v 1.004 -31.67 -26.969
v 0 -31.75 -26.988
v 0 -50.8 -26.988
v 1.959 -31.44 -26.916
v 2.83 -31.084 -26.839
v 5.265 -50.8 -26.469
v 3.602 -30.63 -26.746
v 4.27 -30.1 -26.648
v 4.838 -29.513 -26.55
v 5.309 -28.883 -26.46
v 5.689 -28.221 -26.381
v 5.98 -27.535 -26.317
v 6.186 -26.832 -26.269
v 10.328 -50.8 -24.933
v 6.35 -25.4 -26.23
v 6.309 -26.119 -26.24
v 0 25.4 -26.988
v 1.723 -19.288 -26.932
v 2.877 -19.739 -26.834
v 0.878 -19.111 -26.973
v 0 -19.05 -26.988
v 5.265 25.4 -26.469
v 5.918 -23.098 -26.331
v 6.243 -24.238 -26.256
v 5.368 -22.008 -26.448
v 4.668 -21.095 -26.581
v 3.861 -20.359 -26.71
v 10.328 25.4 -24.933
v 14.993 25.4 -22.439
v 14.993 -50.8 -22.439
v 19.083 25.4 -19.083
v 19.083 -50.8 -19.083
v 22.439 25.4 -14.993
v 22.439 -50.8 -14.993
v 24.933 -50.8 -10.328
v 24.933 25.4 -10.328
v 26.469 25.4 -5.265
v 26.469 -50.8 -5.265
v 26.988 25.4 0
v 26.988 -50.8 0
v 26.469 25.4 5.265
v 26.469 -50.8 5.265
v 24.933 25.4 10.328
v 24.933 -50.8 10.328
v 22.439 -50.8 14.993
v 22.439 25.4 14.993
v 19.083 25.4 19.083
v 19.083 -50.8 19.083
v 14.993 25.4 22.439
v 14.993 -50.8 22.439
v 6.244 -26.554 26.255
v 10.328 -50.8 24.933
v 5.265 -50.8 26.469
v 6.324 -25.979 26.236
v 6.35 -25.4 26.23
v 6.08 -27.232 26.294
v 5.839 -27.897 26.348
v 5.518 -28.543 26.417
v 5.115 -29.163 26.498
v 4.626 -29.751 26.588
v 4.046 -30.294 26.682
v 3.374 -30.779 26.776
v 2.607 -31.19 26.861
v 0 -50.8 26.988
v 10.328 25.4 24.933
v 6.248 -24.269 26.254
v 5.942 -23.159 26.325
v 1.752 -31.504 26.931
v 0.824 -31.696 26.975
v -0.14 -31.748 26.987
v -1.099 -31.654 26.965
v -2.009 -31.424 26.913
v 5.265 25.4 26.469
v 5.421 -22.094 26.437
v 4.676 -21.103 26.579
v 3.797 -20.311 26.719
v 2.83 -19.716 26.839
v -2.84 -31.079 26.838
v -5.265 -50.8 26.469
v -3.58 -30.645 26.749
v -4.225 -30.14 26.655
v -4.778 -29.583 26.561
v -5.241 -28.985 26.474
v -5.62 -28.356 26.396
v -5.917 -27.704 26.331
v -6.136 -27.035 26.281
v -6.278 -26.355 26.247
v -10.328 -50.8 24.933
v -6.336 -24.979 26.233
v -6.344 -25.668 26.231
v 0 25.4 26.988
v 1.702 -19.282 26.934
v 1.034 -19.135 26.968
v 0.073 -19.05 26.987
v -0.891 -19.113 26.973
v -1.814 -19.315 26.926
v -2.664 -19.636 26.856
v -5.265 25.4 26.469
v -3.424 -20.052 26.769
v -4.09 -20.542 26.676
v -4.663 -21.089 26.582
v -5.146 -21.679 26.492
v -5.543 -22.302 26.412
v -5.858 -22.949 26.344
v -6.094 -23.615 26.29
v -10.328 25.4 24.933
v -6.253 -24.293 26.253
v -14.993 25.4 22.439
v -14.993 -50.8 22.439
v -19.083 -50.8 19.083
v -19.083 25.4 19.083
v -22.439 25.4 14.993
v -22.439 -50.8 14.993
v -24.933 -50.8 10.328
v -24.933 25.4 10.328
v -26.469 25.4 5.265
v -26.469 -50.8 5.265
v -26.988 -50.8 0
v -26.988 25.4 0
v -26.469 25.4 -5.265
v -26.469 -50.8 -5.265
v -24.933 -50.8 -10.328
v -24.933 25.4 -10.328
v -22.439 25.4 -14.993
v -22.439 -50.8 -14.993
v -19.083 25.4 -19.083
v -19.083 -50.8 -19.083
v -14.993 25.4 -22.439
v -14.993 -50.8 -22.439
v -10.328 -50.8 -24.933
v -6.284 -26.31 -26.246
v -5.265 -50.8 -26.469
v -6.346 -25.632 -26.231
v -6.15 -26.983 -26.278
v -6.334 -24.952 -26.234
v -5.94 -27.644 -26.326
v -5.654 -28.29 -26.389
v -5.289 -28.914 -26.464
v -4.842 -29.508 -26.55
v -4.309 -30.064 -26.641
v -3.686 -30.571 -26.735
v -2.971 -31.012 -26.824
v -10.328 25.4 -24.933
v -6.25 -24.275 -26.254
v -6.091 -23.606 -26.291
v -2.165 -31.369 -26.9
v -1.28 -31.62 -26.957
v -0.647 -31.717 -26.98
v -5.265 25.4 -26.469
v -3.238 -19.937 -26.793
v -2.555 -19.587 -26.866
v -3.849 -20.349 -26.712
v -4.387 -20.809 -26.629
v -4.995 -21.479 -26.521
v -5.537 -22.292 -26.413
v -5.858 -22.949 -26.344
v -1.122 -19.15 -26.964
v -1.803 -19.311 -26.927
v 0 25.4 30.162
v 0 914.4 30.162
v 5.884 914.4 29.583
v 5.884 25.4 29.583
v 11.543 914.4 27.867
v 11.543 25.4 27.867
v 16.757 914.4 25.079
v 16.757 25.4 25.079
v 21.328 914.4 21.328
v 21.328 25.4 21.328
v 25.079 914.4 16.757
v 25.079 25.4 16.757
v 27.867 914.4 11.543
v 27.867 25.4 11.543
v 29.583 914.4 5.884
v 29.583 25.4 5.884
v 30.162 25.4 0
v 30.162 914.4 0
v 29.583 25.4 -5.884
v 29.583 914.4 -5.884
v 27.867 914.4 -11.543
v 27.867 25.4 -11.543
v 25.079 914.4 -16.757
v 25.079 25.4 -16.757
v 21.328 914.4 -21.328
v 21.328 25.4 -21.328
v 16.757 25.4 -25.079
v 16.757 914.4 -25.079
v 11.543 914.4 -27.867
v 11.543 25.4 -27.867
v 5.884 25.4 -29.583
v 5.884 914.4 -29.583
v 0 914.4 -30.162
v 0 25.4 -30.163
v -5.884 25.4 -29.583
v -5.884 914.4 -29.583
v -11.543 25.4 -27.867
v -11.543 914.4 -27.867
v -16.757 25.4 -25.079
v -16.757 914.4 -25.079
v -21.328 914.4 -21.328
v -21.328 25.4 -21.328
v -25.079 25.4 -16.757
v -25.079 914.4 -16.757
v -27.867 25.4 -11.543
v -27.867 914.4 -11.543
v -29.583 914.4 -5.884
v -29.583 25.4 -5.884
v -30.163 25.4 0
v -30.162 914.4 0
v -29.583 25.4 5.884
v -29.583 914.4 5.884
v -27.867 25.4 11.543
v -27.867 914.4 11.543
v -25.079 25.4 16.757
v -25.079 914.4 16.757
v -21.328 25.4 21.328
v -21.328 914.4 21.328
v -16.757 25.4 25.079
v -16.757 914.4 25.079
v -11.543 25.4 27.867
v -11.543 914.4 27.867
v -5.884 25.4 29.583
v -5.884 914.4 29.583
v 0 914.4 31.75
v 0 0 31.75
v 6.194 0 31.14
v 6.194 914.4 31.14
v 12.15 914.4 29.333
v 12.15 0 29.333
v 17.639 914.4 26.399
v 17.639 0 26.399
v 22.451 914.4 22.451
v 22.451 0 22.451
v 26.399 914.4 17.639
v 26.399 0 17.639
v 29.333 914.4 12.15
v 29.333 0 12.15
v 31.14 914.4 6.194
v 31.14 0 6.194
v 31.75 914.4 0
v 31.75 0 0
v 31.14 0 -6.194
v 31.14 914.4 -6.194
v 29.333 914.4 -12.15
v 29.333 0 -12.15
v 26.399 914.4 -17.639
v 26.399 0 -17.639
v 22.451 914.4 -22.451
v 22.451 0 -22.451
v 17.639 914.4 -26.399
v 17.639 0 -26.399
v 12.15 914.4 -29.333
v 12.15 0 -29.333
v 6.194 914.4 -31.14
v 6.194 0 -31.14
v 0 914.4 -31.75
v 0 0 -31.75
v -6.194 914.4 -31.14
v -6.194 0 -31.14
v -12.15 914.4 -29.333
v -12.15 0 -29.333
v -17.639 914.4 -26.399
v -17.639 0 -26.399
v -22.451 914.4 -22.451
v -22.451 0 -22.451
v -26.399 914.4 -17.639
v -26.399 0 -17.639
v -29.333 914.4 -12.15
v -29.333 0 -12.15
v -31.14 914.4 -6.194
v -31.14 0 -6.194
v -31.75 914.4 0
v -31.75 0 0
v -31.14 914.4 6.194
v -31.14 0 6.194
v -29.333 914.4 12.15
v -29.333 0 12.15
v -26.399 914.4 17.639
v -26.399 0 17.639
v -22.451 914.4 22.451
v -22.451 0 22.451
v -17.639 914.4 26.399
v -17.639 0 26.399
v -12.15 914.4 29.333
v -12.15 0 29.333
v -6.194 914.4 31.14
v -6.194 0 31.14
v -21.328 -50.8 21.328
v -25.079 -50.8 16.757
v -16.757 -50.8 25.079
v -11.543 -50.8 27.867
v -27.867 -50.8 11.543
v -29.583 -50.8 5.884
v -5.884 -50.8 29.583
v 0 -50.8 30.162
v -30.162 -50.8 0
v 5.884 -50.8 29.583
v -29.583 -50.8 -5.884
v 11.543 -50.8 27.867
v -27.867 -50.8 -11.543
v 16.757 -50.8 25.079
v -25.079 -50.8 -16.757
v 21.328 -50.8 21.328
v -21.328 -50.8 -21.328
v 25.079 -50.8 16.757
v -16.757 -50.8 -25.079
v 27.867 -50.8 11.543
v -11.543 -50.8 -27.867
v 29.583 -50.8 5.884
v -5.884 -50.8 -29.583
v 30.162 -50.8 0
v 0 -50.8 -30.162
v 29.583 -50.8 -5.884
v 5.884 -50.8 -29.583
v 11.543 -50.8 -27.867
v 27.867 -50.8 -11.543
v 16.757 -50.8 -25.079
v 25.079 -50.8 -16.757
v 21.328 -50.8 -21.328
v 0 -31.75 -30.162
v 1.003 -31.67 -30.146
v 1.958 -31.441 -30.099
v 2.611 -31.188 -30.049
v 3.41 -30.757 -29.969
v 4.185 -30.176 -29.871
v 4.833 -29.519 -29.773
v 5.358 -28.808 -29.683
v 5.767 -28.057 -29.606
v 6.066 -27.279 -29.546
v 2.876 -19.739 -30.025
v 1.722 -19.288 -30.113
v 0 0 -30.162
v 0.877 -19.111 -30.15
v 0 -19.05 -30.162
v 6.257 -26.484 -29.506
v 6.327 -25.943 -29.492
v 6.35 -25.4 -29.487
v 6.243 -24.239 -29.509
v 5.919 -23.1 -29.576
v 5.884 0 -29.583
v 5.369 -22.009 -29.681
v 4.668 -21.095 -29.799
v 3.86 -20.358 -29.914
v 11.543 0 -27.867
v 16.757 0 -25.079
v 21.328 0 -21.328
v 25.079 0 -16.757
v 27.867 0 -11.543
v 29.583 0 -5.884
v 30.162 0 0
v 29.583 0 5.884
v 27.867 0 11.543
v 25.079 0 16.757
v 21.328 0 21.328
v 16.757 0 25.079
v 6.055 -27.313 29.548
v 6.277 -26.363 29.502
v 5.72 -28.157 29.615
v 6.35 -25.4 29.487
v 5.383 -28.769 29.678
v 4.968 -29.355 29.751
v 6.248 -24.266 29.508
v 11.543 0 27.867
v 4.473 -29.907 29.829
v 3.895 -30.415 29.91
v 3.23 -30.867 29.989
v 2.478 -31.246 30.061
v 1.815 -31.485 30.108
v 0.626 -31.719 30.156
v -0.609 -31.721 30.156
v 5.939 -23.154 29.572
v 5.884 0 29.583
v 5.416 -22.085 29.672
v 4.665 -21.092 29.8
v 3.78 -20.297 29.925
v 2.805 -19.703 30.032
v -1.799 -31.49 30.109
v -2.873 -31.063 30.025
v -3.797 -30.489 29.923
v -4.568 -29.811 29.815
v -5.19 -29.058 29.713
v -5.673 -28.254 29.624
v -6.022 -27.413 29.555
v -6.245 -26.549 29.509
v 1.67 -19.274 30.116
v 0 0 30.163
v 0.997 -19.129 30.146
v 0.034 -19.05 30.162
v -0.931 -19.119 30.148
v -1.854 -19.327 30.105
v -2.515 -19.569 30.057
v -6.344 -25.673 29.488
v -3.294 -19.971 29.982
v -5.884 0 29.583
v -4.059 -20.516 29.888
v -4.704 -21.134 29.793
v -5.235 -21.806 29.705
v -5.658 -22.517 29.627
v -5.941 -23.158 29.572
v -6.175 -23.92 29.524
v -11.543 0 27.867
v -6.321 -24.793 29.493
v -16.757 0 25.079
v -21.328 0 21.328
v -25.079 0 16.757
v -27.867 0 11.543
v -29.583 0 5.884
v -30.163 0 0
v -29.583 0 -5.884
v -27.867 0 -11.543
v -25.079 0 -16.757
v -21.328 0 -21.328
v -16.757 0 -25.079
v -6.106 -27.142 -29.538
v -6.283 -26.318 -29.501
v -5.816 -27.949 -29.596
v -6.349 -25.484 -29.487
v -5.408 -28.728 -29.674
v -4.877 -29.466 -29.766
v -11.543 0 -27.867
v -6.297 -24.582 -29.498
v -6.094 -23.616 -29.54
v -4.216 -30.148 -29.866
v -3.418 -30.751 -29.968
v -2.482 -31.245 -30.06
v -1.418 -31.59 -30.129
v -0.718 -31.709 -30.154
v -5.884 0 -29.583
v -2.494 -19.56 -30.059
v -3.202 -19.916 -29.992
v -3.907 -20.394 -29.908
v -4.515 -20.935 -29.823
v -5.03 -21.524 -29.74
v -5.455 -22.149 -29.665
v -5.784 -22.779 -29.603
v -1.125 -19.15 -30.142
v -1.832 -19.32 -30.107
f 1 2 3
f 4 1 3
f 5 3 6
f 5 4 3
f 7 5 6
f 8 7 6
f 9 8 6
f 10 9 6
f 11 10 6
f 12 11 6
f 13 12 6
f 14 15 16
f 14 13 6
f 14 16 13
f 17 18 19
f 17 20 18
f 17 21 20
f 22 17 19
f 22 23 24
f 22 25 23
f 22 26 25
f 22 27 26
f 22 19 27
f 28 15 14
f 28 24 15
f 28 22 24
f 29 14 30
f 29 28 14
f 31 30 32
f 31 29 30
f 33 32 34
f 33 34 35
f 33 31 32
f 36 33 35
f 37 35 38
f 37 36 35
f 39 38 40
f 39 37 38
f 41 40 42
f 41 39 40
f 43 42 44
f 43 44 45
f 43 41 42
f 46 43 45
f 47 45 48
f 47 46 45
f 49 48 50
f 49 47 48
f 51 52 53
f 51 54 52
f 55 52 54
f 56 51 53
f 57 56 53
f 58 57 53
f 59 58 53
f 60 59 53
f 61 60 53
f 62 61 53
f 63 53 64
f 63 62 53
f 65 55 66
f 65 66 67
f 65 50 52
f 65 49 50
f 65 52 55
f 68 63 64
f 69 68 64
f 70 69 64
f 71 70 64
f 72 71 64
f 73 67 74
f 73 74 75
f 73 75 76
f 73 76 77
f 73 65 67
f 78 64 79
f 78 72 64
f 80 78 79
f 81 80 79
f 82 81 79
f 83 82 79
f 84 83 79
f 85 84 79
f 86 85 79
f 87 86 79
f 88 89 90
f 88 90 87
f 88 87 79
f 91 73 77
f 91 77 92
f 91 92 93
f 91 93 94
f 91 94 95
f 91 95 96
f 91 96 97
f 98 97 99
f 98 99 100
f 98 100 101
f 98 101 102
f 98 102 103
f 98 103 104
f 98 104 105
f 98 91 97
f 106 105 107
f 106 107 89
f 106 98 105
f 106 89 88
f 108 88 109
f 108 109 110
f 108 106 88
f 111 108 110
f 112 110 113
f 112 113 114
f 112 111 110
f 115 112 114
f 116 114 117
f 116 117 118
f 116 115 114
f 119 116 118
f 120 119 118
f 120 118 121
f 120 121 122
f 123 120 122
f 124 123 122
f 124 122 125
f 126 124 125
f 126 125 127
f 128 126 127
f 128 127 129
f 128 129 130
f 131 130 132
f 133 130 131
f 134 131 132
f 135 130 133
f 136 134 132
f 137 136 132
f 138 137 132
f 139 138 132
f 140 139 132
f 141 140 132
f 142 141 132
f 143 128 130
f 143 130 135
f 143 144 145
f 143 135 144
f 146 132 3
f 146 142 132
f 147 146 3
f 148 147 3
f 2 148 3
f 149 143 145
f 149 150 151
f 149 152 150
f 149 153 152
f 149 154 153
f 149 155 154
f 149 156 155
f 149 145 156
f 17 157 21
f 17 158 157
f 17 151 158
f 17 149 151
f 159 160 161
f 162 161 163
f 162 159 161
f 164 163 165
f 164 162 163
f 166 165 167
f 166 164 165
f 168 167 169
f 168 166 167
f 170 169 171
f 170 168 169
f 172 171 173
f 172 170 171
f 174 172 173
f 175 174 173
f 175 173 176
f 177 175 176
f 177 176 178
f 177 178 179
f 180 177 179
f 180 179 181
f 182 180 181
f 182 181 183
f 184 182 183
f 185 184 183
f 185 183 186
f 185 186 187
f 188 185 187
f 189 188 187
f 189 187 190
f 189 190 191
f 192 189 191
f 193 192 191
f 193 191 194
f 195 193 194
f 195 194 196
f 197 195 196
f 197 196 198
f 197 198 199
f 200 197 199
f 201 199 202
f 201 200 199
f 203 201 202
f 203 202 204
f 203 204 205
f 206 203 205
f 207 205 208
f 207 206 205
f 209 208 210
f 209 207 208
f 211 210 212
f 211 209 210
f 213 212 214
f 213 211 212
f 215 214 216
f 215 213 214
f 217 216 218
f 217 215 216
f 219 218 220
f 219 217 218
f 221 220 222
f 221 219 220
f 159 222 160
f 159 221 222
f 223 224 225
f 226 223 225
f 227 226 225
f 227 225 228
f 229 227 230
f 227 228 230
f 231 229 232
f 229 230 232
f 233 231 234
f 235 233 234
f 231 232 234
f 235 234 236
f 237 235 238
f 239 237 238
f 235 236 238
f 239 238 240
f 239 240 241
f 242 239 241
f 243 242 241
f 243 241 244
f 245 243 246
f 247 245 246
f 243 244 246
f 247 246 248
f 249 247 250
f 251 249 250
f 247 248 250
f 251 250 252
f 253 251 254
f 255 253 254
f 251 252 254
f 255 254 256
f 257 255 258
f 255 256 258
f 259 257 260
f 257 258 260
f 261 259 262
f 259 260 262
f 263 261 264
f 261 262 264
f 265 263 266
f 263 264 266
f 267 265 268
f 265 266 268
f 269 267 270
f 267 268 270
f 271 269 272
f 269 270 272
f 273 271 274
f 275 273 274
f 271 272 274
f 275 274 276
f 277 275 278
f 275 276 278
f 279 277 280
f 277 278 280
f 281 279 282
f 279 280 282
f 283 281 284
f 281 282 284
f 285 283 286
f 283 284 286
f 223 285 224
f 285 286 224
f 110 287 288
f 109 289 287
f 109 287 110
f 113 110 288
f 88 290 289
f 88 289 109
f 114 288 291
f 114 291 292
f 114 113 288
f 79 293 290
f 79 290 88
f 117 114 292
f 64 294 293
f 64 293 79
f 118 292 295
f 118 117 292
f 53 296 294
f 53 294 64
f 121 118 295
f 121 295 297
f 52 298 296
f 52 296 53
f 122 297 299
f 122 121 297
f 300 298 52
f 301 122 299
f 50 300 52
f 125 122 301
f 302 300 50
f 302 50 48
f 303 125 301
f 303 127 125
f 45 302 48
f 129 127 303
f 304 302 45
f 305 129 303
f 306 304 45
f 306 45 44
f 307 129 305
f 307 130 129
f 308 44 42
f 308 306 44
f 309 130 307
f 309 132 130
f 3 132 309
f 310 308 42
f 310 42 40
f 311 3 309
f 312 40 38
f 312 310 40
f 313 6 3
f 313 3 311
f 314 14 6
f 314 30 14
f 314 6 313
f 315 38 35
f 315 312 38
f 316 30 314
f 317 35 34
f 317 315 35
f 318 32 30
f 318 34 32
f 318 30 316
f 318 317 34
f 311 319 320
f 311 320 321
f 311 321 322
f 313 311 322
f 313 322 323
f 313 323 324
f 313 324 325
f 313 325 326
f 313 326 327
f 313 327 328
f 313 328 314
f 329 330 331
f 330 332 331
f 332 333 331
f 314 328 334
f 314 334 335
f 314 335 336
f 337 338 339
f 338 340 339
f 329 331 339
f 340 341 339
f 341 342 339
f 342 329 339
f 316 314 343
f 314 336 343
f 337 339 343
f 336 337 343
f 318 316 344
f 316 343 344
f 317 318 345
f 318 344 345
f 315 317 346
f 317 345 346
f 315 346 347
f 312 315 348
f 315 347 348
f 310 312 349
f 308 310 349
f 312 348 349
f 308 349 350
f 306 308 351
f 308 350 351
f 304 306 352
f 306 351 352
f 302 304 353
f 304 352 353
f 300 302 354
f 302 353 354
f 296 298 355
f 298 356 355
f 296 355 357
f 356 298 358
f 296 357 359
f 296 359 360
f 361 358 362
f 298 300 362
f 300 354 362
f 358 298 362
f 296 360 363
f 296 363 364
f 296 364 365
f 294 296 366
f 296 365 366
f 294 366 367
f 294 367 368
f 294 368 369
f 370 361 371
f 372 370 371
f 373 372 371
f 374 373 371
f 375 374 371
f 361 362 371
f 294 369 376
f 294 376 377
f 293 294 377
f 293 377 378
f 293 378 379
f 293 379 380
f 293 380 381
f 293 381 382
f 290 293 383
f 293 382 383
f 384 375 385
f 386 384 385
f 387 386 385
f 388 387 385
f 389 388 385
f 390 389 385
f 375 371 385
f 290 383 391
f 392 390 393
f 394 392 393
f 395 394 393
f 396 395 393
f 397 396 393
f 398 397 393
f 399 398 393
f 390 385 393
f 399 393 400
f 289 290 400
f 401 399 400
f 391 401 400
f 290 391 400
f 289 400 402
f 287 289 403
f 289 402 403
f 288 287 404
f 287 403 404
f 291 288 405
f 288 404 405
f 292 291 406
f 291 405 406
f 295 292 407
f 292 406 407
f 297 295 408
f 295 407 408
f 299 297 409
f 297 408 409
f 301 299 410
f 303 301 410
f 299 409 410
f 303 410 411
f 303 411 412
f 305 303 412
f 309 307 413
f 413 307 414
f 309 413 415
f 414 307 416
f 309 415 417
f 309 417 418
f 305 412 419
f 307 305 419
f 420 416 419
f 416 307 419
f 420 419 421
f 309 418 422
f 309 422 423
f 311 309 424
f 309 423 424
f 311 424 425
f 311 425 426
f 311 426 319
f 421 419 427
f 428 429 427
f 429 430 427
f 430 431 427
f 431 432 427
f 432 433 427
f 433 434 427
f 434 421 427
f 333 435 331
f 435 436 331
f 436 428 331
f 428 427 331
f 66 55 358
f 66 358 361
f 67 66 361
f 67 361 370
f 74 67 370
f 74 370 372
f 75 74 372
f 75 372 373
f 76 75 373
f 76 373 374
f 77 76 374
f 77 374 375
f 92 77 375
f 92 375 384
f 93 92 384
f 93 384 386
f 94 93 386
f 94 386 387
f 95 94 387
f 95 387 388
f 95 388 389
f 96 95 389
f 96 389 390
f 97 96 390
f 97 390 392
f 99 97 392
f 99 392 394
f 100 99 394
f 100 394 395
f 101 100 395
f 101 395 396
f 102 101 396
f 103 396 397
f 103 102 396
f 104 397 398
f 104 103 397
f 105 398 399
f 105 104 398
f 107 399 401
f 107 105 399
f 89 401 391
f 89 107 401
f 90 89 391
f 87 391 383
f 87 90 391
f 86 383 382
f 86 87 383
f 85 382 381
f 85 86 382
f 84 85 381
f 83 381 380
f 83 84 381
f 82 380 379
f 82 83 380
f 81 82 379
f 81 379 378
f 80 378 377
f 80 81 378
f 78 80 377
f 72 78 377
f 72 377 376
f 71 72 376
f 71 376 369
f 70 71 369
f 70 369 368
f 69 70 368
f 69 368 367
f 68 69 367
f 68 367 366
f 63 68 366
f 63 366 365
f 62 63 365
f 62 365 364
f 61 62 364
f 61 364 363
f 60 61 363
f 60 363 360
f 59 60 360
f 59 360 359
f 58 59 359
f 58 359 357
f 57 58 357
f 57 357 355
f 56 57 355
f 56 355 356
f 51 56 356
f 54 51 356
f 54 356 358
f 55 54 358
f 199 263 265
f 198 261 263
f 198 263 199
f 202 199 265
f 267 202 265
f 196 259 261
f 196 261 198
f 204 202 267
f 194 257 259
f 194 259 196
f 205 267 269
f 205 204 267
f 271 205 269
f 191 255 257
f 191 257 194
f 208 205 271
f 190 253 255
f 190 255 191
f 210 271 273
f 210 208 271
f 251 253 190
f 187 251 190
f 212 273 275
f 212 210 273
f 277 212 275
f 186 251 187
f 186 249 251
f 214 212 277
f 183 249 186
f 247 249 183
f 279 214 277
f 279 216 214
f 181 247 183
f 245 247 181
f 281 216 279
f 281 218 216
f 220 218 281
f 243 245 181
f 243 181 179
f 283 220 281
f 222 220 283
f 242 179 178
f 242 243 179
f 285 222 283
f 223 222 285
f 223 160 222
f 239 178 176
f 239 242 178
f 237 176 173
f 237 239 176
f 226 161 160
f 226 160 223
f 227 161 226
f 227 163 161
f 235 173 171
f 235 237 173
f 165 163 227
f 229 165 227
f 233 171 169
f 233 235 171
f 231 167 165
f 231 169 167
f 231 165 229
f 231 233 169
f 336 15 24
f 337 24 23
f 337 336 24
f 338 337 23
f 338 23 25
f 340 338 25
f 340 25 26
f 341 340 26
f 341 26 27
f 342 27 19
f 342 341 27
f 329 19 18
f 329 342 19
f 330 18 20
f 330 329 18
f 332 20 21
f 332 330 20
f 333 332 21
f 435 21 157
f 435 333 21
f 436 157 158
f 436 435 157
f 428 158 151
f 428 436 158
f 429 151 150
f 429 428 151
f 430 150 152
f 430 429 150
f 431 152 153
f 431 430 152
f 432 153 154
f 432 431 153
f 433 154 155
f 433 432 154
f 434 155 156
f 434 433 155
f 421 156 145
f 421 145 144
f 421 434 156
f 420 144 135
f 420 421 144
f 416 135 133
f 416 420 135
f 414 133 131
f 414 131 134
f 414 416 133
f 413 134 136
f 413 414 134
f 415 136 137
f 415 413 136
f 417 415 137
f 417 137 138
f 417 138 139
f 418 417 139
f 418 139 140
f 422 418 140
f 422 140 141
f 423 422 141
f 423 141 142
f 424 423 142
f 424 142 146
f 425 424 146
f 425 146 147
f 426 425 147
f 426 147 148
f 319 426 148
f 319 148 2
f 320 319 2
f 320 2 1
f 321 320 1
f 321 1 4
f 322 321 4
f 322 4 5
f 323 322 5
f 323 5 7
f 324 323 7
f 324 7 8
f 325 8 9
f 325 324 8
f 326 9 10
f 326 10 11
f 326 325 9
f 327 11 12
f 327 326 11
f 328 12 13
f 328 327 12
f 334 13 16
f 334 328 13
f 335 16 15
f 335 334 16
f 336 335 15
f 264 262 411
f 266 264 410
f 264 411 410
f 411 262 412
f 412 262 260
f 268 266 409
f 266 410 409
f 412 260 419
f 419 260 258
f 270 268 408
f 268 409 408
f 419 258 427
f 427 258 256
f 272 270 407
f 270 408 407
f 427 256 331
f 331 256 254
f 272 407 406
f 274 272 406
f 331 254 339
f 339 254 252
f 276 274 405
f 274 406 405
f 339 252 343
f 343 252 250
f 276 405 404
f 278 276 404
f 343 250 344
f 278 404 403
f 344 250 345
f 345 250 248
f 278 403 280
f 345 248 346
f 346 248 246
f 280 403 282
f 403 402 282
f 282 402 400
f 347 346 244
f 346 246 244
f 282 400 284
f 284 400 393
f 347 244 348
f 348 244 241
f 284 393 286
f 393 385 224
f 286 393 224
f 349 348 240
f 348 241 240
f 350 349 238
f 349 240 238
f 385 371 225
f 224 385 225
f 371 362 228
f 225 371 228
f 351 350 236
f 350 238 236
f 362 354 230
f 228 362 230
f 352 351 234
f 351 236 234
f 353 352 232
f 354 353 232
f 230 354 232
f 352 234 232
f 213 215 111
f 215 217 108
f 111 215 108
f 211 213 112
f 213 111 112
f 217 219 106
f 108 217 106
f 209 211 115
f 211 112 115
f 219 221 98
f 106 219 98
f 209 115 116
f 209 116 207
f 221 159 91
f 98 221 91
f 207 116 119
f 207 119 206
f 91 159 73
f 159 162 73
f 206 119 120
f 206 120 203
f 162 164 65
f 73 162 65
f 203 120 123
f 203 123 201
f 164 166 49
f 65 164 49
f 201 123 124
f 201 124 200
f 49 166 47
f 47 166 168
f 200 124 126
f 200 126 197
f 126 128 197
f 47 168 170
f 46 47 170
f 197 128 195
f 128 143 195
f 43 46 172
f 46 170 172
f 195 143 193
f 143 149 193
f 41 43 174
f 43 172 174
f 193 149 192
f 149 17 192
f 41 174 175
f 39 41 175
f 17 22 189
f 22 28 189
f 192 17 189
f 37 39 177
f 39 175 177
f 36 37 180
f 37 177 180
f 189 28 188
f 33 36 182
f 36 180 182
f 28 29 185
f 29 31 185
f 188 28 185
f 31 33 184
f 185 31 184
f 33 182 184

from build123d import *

# Parameters (mm, degrees)
SKETCH1_R                = 31.75
SKETCH1_R_2              = 30.1625
BOSS_EXTRUDE1_DEPTH      = 914.4
BOSS_EXTRUDE2_DEPTH      = 50.8
BOSS_EXTRUDE2_DEPTH_BACK = 25.4
SKETCH3_R                = 30.1625
SKETCH3_R_2              = 26.9875
CUT_EXTRUDE2_DEPTH       = 916.501766792
CUT_EXTRUDE2_DEPTH_BACK  = 916.501766792
SKETCH7_R                = 6.35


with BuildPart() as part:
    # Sketch1 → Boss-Extrude1 (new body)
    with BuildSketch(Plane(origin=(0, 0, 0), x_dir=(1, 0, 0), z_dir=(0, 1, 0))):
        with Locations(Location((0, 0, 0), (0, 0, 270))):
            Circle(SKETCH1_R)
        with Locations(Location((0, 0, 0), (0, 0, 270))):
            Circle(SKETCH1_R_2, mode=Mode.SUBTRACT)
    extrude(amount=BOSS_EXTRUDE1_DEPTH)

    # Sketch3 → Boss-Extrude2 (add, two sides: drawn at the far end of the back side and taken through both)
    with BuildSketch(Plane.XZ.offset(-BOSS_EXTRUDE2_DEPTH_BACK)):
        with Locations(Location((0, 0, 0), (0, 0, 270))):
            Circle(SKETCH3_R)
        with Locations(Location((0, 0, 0), (0, 0, 270))):
            Circle(SKETCH3_R_2, mode=Mode.SUBTRACT)
    extrude(amount=BOSS_EXTRUDE2_DEPTH + BOSS_EXTRUDE2_DEPTH_BACK)

    # Sketch7 → Cut-Extrude2 (cut, two sides: drawn at the far end of the back side and taken through both)
    with BuildSketch(Plane.XY.offset(-CUT_EXTRUDE2_DEPTH_BACK)):
        with Locations((0, -25.4)):
            Circle(SKETCH7_R)
    extrude(amount=CUT_EXTRUDE2_DEPTH + CUT_EXTRUDE2_DEPTH_BACK, mode=Mode.SUBTRACT)


solid = part.part
